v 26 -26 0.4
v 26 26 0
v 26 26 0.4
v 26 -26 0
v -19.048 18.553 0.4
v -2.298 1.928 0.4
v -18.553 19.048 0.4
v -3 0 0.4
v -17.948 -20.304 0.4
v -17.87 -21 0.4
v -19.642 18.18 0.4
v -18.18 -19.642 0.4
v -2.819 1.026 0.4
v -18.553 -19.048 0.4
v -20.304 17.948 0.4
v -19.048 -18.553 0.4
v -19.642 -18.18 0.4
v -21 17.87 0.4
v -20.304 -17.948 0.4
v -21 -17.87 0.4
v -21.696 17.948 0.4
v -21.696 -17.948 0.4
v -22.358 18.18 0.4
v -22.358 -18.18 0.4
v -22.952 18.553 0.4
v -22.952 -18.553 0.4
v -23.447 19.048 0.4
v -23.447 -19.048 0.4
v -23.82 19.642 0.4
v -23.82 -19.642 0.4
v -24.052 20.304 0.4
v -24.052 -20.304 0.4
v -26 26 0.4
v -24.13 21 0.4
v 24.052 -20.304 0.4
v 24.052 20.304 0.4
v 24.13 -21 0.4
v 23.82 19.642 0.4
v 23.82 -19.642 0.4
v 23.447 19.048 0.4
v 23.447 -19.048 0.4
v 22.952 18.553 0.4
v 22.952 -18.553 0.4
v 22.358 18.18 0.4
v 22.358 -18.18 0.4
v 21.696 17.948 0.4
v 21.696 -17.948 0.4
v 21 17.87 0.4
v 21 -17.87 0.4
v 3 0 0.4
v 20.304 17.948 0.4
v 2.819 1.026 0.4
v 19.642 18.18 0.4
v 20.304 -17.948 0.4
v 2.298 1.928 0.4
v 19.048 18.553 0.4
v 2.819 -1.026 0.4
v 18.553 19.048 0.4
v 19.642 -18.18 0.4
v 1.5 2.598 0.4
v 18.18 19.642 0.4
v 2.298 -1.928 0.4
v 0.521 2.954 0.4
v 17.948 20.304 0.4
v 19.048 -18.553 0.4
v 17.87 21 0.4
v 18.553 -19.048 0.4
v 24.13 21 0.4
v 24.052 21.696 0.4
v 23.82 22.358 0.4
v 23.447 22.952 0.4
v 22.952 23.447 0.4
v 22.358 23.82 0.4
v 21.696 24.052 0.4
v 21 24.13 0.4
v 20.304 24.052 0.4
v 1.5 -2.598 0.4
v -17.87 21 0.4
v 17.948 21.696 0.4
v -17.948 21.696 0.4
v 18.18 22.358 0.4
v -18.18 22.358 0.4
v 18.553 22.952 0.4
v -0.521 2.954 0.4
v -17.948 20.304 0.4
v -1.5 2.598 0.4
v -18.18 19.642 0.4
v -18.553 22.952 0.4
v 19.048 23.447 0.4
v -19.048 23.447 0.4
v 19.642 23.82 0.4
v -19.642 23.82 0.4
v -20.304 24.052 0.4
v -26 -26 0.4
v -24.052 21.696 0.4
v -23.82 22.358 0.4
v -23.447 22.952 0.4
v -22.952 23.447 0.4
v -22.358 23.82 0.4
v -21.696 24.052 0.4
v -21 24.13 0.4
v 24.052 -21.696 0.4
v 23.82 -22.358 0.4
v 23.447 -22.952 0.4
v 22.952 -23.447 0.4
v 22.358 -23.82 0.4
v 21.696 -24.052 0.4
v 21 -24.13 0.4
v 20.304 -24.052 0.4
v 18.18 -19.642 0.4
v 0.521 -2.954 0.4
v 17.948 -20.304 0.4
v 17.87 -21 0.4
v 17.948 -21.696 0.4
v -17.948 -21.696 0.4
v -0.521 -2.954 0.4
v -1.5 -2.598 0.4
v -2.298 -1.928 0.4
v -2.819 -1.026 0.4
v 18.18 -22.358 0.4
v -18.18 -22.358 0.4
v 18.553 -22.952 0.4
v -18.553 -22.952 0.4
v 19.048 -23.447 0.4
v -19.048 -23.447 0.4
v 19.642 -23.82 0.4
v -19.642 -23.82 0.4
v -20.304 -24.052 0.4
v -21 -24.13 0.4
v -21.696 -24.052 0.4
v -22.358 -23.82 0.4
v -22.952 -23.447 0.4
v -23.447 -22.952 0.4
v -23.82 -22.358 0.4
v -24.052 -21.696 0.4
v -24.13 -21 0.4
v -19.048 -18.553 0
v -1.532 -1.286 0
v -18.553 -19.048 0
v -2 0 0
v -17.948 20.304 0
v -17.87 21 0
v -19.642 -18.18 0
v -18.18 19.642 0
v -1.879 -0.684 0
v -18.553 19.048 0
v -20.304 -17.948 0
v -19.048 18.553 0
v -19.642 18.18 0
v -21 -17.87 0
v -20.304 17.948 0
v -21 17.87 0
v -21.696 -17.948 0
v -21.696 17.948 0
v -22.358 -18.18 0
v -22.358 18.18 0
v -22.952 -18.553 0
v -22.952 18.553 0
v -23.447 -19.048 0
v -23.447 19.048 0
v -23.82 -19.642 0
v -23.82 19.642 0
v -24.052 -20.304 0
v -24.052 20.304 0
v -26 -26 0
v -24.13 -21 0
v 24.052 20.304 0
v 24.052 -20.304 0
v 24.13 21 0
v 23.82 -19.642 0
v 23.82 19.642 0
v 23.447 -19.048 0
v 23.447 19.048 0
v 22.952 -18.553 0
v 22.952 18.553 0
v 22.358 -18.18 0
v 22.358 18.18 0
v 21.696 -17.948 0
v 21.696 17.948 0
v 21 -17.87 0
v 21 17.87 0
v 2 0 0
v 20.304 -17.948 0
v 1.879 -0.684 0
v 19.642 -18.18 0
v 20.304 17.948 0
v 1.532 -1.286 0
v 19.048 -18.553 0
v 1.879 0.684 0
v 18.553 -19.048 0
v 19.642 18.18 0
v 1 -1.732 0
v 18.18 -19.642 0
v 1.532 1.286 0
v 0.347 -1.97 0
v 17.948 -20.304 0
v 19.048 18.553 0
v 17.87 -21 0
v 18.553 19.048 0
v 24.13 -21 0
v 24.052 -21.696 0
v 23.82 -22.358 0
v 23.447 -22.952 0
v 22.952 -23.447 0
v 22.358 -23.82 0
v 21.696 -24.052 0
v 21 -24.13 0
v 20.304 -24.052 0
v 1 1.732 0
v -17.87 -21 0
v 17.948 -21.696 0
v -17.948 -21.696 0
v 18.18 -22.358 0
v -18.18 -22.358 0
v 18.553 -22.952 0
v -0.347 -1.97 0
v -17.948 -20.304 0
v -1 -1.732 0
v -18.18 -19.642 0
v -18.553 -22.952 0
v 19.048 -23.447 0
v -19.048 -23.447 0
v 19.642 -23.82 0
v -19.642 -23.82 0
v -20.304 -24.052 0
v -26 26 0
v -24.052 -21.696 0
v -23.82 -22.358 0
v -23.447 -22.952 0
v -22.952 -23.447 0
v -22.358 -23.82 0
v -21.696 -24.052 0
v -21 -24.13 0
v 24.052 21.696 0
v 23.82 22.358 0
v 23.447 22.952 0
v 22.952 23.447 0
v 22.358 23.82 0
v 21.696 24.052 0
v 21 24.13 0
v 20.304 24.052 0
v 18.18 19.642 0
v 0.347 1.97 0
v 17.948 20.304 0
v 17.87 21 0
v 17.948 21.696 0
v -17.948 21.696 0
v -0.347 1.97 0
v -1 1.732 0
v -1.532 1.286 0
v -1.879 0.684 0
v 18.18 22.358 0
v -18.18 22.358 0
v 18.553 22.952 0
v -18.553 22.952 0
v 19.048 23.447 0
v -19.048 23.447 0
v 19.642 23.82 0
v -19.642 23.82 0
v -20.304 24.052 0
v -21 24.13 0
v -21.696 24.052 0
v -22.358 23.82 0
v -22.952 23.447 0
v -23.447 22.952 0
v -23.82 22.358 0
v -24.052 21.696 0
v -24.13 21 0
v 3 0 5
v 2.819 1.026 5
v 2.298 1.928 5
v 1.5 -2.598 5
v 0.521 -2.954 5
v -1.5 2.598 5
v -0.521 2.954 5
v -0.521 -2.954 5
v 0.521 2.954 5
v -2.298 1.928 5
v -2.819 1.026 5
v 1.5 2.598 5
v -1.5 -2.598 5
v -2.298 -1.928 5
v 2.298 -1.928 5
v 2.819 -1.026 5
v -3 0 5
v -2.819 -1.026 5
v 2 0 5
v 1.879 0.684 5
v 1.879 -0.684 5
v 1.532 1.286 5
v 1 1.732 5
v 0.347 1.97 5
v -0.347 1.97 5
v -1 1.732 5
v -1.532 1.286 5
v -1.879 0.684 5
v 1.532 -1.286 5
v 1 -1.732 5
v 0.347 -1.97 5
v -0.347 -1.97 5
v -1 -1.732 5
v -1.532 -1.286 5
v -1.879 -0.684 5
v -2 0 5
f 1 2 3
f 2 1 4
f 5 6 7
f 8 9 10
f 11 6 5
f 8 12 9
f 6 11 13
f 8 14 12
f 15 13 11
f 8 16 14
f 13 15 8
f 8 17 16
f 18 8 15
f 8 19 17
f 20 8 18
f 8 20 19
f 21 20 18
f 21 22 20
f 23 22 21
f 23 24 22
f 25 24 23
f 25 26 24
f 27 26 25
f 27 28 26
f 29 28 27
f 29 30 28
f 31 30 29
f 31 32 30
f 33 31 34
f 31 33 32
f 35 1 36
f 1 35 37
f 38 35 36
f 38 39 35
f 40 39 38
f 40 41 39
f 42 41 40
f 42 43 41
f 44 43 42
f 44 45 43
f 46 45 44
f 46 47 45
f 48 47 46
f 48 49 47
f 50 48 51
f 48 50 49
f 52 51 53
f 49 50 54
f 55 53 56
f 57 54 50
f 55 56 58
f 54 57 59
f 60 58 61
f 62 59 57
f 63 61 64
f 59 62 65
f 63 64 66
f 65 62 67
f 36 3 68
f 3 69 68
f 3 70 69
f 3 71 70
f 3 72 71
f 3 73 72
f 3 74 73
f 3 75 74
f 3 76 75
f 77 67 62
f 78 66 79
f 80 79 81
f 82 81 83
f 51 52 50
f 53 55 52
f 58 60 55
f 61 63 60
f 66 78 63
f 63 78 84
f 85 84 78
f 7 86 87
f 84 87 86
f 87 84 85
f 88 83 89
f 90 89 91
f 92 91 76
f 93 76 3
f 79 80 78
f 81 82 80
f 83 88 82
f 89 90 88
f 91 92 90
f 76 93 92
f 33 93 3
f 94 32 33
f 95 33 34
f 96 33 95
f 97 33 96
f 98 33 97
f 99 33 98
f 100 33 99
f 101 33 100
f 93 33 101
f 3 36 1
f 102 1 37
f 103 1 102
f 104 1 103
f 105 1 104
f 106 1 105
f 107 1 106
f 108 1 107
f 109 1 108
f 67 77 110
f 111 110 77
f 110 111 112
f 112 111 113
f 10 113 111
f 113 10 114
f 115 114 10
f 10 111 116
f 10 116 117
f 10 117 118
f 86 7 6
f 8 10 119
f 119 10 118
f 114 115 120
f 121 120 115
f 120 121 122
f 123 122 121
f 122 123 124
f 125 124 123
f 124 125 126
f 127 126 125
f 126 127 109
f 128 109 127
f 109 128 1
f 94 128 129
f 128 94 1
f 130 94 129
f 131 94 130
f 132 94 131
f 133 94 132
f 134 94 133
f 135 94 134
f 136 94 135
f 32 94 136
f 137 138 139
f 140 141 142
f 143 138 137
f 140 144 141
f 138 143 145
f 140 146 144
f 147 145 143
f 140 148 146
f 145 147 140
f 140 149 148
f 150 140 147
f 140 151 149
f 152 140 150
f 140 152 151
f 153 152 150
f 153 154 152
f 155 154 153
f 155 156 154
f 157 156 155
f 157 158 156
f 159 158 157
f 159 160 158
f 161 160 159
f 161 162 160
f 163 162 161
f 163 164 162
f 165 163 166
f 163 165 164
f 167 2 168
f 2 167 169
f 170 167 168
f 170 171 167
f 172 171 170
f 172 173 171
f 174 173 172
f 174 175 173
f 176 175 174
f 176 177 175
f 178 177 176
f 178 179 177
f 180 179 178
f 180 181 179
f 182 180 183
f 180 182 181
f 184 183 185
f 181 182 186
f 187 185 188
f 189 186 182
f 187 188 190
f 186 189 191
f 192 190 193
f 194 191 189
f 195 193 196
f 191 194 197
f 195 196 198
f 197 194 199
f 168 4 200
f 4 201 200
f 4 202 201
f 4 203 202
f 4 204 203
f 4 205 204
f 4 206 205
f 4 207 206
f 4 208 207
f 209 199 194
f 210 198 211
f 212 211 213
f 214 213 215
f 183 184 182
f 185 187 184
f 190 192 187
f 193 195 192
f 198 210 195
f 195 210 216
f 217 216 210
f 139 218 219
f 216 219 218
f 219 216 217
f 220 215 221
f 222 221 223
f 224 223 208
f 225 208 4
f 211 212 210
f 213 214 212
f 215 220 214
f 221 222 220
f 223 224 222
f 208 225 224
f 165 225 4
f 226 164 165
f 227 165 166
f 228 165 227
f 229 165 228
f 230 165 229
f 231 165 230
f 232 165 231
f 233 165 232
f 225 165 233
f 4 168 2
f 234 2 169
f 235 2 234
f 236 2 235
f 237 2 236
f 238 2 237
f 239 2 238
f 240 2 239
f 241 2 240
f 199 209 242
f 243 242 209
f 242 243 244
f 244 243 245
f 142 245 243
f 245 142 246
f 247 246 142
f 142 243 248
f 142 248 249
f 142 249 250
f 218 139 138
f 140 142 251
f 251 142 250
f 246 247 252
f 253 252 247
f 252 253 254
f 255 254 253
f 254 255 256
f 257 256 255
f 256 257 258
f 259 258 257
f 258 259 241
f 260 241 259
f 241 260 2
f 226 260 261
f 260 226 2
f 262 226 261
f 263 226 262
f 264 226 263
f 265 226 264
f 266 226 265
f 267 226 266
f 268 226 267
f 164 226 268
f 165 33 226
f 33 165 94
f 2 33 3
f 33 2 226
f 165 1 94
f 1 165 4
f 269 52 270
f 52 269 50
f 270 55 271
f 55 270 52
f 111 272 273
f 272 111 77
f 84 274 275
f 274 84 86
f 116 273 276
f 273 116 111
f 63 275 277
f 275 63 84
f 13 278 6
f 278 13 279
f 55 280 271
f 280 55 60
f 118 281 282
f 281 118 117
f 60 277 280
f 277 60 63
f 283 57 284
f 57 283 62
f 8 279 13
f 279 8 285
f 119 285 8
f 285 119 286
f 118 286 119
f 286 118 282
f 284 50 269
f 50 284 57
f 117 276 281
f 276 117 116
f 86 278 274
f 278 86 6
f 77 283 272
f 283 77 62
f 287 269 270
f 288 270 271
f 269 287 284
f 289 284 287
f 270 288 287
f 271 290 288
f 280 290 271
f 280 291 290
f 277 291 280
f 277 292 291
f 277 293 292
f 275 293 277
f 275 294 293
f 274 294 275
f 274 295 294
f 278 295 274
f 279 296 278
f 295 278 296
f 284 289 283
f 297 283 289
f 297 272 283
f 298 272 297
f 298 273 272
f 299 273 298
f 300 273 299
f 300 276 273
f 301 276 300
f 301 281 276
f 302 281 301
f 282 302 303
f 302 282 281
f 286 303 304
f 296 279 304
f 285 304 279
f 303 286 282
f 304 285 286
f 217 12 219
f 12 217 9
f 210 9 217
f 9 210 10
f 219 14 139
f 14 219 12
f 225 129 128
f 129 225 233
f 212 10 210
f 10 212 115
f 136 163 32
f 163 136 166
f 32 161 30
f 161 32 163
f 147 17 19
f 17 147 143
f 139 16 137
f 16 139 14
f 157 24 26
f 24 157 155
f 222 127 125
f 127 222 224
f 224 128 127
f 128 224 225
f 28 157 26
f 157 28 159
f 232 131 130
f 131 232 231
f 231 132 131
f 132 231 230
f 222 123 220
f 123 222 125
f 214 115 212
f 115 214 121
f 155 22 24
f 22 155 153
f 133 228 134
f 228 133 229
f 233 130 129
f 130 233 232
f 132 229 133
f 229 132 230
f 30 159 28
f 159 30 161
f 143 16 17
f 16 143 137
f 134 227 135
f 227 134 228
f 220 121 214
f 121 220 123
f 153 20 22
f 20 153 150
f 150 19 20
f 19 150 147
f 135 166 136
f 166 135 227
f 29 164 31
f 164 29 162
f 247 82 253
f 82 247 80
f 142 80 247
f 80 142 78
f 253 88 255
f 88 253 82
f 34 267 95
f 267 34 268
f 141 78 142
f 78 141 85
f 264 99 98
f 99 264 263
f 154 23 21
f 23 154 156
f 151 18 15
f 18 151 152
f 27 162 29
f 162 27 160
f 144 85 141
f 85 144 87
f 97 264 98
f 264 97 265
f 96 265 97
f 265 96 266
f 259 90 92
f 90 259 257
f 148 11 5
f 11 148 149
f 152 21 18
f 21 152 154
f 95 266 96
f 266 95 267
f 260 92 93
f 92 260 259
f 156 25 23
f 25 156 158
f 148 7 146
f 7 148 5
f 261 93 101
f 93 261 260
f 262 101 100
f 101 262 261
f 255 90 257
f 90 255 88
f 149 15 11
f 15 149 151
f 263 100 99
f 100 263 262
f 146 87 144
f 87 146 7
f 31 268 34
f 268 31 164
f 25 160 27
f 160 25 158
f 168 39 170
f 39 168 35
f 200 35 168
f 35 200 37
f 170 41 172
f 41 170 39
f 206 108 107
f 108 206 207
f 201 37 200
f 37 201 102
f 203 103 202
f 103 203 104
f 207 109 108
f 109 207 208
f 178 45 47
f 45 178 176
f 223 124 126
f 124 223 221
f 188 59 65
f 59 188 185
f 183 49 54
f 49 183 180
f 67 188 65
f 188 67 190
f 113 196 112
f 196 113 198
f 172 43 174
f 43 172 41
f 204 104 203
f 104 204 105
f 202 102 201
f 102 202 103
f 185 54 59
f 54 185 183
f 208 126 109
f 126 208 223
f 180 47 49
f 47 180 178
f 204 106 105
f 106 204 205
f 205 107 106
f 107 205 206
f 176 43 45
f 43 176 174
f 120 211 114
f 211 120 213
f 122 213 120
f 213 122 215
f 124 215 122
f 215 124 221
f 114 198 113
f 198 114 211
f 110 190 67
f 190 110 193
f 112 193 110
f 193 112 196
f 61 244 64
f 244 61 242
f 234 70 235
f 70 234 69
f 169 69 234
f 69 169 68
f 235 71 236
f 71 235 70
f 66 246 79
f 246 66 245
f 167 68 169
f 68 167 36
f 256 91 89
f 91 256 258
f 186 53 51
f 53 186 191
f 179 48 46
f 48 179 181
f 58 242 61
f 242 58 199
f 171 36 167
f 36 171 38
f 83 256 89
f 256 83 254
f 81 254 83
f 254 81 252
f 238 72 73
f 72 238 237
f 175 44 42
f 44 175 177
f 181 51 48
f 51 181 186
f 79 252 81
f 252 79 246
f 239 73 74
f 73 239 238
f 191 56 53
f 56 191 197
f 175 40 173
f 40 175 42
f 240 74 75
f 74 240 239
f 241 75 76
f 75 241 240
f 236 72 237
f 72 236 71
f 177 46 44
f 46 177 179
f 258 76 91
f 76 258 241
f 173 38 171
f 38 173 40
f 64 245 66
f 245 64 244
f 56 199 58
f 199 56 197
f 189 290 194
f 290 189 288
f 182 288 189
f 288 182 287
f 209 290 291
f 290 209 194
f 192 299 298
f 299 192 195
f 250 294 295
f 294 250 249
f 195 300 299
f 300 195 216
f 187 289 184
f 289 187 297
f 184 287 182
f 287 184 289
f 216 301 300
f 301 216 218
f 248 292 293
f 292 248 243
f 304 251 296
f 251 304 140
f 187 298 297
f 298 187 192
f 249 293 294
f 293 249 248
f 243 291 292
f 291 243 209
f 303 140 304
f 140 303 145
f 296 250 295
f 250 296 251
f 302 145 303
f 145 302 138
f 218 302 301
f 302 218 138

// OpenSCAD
module triangle(side_len, prism_len, corner_rad){
    rotate([270,0,0])hull(){
        cylinder(r=corner_rad, h=prism_len);
        rotate([0,0,60])translate([side_len-corner_rad*2,0,0])cylinder(r=corner_rad, h=prism_len);
        rotate([0,0,120])translate([side_len-corner_rad*2,0,0])cylinder(r=corner_rad, h=prism_len);
    }  
}



    cage_size = 21; //42mm / 2
module cage_adapter(){
    difference(){
intersection(){
    $fn=20;
difference(){
 translate([0,0,4]){   
cube([52,55,8],center=true);
 }
for(x=[-1*cage_size,cage_size]){
    for(y=[-1*cage_size,cage_size]){
    translate([x,y,-1]){
    cylinder(d=6.26,h=25,$fn=28);//h=12
    }//end translate
}//end for
}//end for
translate([0,0,5]){
cube([50,30,12],center=true);
cube([32,53,12],center=true);
}//end translate
}//end difference

translate([0,-60,0])rotate([0,0,45])cube(100); // a big cube to chop off pesky corners
} // end intersection
union(){
    translate([cage_size,-2*cage_size,5])triangle(2.5,200,0.1);
    translate([-1*cage_size,-2*cage_size,5])triangle(2.5,200,0.1);
}//end union
} //end difference
}//end module


//cage_adapter();
//difference(){
//union(){
  //  translate([0,0,3])cylinder(h=6,r=2, center=true, $fn=18);
//translate([0,0,0.2]){
//rotate([0,0,45])cube([3,cage_size*2.3,0.4], center=true);
//rotate([0,0,-45])cube([3,cage_size*2.3,0.4], center=true);
//} // end translate
//} // end union
    //translate([0,0,3])cylinder(r=1.5,h=6,center=true, $fn=18);
//} // end difference

module calibration_card(){
    difference(){
        union(){
        translate([0,0,0.2])cube([52,52,0.4],center=true);
            translate([0,0,2.5])cylinder(r=3,h=5,center=true,$fn=18);
        }// end union
        cylinder(r=2,h=11,center=true,$fn=18);
        for(x=[-1*cage_size,cage_size]){
            for(y=[-1*cage_size,cage_size]){
            translate([x,y,-1]){
                cylinder(d=6.26,h=25,$fn=28);//h=12
            }//end translate
            }//end for
        }//end for
    }// end module
}//end module

calibration_card();
